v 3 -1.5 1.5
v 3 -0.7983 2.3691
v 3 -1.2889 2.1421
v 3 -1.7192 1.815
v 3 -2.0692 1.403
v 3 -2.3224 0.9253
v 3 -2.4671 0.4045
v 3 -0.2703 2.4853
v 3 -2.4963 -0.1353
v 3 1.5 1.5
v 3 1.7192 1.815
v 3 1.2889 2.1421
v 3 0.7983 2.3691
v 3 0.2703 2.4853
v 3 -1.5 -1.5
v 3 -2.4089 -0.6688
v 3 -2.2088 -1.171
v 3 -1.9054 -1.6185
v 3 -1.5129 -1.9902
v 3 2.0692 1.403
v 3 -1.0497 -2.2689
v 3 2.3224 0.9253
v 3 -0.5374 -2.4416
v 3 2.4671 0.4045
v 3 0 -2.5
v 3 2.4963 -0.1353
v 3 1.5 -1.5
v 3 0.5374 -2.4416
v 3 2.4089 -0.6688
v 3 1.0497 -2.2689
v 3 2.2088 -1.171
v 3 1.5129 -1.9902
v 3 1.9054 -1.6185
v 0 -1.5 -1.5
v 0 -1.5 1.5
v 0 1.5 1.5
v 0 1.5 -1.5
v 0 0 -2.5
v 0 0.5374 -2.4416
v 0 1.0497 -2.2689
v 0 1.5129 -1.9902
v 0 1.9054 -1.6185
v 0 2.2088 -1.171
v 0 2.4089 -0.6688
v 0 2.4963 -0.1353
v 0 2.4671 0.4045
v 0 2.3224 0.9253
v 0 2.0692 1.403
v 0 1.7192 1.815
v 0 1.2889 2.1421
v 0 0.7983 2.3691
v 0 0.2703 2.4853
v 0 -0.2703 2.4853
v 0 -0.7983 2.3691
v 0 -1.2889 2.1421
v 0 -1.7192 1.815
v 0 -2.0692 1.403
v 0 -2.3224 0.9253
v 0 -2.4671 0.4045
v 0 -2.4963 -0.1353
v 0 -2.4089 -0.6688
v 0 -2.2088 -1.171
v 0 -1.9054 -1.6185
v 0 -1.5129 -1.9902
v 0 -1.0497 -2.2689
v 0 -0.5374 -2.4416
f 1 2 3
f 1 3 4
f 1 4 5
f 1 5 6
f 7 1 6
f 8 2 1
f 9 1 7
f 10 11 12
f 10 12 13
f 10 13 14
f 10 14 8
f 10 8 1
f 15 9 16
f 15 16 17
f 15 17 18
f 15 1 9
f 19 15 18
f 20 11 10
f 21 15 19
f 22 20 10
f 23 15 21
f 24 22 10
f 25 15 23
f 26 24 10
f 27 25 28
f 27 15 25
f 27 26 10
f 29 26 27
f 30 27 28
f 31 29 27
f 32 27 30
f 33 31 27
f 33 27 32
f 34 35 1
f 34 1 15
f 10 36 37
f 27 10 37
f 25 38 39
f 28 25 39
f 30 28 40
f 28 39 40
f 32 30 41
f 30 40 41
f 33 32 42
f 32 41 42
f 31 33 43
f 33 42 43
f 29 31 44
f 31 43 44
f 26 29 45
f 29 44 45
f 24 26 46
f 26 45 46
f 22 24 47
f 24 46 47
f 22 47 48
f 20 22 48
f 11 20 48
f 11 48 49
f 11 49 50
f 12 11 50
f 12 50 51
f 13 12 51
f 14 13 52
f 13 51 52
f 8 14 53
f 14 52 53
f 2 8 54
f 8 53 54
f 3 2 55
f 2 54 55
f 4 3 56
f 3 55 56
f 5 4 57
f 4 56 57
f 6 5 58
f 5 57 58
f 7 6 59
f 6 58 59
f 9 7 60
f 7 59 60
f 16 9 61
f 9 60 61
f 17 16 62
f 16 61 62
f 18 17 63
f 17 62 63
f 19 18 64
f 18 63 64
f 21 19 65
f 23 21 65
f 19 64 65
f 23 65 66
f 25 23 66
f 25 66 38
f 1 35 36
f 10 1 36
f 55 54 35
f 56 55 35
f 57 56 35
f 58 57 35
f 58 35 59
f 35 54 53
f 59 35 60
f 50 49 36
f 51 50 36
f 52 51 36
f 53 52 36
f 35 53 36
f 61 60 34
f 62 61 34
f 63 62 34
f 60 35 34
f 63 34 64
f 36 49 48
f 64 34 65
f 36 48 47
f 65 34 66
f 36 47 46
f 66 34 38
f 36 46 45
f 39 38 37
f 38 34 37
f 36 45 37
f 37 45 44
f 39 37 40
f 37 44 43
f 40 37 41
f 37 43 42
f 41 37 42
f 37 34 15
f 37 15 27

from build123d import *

# Parameters (mm, degrees)
SKETCH1_R           = 2.5
SKETCH1_W           = 3
SKETCH1_H           = 3
BOSS_EXTRUDE1_DEPTH = 3


with BuildPart() as part:
    # Sketch1 → Boss-Extrude1 (new body)
    with BuildSketch(Plane(origin=(0, 0, 0), x_dir=(0, 0, -1), z_dir=(1, 0, 0))):
        Circle(SKETCH1_R)
        Rectangle(SKETCH1_W, SKETCH1_H, mode=Mode.SUBTRACT)
    extrude(amount=BOSS_EXTRUDE1_DEPTH)


solid = part.part
